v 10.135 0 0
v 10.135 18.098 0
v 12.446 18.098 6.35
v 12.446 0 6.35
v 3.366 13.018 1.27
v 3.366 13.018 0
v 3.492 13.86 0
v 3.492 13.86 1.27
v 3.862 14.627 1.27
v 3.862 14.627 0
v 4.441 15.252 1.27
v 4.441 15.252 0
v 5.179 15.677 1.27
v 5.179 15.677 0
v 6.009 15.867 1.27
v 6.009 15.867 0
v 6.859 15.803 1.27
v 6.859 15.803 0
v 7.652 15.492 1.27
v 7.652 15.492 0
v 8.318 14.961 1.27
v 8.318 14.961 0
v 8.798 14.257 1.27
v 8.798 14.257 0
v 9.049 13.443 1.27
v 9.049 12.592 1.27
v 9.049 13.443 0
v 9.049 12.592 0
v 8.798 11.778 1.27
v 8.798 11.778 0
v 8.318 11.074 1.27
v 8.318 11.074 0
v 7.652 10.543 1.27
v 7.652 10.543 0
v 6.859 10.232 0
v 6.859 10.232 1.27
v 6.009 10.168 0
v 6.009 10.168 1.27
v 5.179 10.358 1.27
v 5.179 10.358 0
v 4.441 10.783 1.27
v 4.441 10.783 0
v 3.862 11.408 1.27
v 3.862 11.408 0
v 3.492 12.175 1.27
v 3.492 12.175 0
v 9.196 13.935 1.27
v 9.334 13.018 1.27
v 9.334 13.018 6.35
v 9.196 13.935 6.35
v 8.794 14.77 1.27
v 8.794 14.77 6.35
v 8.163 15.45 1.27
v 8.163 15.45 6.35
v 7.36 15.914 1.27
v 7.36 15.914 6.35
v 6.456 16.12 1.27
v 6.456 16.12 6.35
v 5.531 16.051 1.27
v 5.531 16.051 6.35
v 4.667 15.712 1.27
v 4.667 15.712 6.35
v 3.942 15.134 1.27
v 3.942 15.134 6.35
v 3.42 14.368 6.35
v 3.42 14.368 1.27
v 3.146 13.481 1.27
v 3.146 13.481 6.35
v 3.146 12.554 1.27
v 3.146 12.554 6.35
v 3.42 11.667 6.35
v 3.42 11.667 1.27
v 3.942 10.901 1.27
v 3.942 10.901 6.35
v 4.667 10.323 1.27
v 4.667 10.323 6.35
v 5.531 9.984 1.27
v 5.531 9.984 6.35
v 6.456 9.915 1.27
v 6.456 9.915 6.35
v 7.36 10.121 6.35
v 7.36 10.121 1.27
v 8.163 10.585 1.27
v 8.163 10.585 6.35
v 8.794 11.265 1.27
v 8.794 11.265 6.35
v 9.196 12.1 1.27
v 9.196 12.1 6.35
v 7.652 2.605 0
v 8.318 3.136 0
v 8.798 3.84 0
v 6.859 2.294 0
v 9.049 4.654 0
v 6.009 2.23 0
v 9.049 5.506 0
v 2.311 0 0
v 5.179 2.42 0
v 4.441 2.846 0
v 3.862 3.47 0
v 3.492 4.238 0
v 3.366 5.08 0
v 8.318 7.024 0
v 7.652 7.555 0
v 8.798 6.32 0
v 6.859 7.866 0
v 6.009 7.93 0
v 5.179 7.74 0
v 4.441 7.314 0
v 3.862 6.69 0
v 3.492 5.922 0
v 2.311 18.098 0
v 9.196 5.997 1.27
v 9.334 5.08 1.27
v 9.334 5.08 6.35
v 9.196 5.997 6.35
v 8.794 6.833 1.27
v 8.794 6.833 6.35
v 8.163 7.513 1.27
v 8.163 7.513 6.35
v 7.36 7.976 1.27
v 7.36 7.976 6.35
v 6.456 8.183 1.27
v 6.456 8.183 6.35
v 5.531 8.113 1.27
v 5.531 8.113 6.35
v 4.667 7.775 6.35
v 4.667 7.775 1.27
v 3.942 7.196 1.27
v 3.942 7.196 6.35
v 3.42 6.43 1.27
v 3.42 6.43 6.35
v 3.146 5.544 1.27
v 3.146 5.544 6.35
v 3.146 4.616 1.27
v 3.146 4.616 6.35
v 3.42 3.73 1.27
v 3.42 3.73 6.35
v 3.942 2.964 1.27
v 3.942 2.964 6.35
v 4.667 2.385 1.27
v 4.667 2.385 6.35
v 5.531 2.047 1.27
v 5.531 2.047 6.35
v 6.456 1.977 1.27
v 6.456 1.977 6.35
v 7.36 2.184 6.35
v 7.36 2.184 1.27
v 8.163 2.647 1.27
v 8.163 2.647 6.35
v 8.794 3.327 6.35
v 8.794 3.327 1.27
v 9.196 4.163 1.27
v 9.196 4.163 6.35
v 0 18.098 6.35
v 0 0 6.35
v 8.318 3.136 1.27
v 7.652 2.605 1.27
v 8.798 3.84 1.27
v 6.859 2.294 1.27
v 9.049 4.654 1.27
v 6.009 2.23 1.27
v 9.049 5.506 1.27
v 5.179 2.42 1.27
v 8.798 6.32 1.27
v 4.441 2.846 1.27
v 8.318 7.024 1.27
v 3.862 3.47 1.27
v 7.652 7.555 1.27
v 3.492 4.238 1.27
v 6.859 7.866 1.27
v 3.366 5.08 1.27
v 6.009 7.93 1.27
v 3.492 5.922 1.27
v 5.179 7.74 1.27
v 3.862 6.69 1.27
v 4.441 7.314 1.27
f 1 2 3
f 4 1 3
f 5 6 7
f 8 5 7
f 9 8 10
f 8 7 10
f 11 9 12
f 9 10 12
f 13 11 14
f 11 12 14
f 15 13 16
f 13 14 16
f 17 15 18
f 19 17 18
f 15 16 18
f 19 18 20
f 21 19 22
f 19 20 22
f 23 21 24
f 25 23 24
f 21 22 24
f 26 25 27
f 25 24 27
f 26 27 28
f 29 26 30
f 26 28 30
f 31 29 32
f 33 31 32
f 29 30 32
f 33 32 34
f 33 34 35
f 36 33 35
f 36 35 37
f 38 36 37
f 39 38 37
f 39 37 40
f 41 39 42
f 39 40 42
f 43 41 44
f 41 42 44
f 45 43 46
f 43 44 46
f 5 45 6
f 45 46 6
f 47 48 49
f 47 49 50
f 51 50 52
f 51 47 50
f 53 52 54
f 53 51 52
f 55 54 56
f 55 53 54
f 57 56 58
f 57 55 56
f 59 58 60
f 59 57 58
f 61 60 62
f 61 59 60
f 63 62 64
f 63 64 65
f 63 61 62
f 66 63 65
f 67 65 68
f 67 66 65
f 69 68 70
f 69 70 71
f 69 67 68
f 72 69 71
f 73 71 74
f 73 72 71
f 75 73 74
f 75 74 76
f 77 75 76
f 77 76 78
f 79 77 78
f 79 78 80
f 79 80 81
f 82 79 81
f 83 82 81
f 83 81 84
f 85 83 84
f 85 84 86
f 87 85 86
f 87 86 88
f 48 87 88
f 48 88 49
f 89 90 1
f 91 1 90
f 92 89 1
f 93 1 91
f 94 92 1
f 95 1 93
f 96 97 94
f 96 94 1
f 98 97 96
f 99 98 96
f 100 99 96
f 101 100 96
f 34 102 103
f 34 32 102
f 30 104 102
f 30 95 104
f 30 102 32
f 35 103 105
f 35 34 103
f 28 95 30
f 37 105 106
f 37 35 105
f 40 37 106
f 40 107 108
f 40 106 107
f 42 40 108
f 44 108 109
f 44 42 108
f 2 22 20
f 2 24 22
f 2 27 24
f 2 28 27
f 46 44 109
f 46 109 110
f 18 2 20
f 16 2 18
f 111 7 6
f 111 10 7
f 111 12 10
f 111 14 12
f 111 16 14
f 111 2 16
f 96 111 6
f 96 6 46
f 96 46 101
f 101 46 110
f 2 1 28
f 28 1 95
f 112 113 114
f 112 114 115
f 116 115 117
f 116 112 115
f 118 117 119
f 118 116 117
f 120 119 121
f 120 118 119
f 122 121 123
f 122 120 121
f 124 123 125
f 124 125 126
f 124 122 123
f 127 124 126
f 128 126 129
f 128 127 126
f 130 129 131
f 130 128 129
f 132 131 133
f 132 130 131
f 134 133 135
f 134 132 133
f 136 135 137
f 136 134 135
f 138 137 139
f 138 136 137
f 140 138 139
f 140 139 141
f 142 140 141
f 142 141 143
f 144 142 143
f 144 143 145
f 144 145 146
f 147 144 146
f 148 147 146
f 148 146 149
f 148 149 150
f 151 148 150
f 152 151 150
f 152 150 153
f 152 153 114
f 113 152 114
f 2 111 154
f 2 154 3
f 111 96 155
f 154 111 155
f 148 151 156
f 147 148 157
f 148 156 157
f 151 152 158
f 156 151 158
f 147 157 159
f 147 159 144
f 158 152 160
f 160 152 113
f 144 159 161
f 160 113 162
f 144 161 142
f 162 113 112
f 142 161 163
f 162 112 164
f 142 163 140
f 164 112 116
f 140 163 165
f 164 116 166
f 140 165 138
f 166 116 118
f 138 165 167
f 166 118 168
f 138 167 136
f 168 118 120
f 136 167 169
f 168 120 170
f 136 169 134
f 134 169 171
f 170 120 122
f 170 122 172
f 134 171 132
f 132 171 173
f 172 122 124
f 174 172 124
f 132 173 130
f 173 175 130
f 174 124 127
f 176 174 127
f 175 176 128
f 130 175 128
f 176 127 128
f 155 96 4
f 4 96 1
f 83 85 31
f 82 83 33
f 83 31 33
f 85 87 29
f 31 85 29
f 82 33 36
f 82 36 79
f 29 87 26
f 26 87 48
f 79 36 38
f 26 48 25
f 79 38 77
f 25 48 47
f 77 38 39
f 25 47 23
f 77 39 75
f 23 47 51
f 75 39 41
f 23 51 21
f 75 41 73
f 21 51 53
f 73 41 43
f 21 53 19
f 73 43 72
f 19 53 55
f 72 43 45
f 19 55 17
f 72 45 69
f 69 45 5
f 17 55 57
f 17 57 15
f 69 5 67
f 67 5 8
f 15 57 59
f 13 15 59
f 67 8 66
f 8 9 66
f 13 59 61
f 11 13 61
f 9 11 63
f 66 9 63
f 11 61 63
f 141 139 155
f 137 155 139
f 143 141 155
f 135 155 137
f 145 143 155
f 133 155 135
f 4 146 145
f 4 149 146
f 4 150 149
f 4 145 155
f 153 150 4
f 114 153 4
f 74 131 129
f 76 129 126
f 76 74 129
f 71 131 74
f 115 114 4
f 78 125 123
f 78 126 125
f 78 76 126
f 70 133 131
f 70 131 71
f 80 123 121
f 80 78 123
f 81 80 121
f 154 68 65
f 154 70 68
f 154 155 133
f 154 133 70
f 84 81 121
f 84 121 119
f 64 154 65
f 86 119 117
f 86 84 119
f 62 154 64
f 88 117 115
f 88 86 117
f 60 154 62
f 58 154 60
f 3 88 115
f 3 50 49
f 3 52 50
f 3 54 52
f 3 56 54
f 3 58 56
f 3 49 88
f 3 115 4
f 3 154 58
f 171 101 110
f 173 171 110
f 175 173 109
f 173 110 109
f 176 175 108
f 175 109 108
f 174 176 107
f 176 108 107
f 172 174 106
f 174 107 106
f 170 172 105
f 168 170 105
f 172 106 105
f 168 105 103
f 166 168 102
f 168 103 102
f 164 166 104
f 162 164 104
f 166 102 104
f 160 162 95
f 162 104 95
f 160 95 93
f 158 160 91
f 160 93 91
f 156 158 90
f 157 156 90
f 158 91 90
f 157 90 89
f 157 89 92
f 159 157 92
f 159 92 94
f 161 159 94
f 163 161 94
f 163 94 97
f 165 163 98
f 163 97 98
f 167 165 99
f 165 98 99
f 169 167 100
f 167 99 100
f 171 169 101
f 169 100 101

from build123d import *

# Parameters (mm, degrees)
SKETCH1_W           = 12.446
SKETCH1_H           = 18.0975
SKETCH1_R           = 3.1115
BOSS_EXTRUDE1_DEPTH = 6.35
CUT_EXTRUDE1_DEPTH  = 23.863615686
SKETCH3_R           = 3.1115
SKETCH3_R_2         = 2.8575
BOSS_EXTRUDE2_DEPTH = 1.27


with BuildPart() as part:
    # sketch1 → Boss-Extrude1 (new body)
    with BuildSketch(Plane.XY):
        with Locations((6.223, 9.04875)):
            Rectangle(SKETCH1_W, SKETCH1_H)
        with Locations((6.223, 5.08)):
            Circle(SKETCH1_R, mode=Mode.SUBTRACT)
        with Locations((6.223, 13.0175)):
            Circle(SKETCH1_R, mode=Mode.SUBTRACT)
    extrude(amount=BOSS_EXTRUDE1_DEPTH)

    # Sketch2 → Cut-Extrude1 (cut, through all)
    with BuildSketch(Plane(origin=(0, 18.0975, 0), x_dir=(1, 0, 0), z_dir=(0, 1, 0))):
        Polygon((0, -6.35), (0, 0), (2.311210988, 0), align=None)
        Polygon((12.446, -6.35), (12.446, 0), (10.134789012, 0), align=None)
    extrude(amount=-CUT_EXTRUDE1_DEPTH, mode=Mode.SUBTRACT)

    # Sketch3 → Boss-Extrude2 (add)
    # profile 1 of 2: a face of its own
    with BuildSketch(Plane(origin=(0, 0, 0), x_dir=(-1, 0, 0), z_dir=(0, 0, -1))):
        with Locations((-6.223, 5.08)):
            Circle(SKETCH3_R)
        with Locations((-6.223, 5.08)):
            Circle(SKETCH3_R_2, mode=Mode.SUBTRACT)
    # profile 2 of 2: a face of its own
    with BuildSketch(Plane(origin=(0, 0, 0), x_dir=(-1, 0, 0), z_dir=(0, 0, -1))):
        with Locations((-6.223, 13.0175)):
            Circle(SKETCH3_R)
        with Locations((-6.223, 13.0175)):
            Circle(SKETCH3_R_2, mode=Mode.SUBTRACT)
    extrude(amount=-BOSS_EXTRUDE2_DEPTH)


solid = part.part
